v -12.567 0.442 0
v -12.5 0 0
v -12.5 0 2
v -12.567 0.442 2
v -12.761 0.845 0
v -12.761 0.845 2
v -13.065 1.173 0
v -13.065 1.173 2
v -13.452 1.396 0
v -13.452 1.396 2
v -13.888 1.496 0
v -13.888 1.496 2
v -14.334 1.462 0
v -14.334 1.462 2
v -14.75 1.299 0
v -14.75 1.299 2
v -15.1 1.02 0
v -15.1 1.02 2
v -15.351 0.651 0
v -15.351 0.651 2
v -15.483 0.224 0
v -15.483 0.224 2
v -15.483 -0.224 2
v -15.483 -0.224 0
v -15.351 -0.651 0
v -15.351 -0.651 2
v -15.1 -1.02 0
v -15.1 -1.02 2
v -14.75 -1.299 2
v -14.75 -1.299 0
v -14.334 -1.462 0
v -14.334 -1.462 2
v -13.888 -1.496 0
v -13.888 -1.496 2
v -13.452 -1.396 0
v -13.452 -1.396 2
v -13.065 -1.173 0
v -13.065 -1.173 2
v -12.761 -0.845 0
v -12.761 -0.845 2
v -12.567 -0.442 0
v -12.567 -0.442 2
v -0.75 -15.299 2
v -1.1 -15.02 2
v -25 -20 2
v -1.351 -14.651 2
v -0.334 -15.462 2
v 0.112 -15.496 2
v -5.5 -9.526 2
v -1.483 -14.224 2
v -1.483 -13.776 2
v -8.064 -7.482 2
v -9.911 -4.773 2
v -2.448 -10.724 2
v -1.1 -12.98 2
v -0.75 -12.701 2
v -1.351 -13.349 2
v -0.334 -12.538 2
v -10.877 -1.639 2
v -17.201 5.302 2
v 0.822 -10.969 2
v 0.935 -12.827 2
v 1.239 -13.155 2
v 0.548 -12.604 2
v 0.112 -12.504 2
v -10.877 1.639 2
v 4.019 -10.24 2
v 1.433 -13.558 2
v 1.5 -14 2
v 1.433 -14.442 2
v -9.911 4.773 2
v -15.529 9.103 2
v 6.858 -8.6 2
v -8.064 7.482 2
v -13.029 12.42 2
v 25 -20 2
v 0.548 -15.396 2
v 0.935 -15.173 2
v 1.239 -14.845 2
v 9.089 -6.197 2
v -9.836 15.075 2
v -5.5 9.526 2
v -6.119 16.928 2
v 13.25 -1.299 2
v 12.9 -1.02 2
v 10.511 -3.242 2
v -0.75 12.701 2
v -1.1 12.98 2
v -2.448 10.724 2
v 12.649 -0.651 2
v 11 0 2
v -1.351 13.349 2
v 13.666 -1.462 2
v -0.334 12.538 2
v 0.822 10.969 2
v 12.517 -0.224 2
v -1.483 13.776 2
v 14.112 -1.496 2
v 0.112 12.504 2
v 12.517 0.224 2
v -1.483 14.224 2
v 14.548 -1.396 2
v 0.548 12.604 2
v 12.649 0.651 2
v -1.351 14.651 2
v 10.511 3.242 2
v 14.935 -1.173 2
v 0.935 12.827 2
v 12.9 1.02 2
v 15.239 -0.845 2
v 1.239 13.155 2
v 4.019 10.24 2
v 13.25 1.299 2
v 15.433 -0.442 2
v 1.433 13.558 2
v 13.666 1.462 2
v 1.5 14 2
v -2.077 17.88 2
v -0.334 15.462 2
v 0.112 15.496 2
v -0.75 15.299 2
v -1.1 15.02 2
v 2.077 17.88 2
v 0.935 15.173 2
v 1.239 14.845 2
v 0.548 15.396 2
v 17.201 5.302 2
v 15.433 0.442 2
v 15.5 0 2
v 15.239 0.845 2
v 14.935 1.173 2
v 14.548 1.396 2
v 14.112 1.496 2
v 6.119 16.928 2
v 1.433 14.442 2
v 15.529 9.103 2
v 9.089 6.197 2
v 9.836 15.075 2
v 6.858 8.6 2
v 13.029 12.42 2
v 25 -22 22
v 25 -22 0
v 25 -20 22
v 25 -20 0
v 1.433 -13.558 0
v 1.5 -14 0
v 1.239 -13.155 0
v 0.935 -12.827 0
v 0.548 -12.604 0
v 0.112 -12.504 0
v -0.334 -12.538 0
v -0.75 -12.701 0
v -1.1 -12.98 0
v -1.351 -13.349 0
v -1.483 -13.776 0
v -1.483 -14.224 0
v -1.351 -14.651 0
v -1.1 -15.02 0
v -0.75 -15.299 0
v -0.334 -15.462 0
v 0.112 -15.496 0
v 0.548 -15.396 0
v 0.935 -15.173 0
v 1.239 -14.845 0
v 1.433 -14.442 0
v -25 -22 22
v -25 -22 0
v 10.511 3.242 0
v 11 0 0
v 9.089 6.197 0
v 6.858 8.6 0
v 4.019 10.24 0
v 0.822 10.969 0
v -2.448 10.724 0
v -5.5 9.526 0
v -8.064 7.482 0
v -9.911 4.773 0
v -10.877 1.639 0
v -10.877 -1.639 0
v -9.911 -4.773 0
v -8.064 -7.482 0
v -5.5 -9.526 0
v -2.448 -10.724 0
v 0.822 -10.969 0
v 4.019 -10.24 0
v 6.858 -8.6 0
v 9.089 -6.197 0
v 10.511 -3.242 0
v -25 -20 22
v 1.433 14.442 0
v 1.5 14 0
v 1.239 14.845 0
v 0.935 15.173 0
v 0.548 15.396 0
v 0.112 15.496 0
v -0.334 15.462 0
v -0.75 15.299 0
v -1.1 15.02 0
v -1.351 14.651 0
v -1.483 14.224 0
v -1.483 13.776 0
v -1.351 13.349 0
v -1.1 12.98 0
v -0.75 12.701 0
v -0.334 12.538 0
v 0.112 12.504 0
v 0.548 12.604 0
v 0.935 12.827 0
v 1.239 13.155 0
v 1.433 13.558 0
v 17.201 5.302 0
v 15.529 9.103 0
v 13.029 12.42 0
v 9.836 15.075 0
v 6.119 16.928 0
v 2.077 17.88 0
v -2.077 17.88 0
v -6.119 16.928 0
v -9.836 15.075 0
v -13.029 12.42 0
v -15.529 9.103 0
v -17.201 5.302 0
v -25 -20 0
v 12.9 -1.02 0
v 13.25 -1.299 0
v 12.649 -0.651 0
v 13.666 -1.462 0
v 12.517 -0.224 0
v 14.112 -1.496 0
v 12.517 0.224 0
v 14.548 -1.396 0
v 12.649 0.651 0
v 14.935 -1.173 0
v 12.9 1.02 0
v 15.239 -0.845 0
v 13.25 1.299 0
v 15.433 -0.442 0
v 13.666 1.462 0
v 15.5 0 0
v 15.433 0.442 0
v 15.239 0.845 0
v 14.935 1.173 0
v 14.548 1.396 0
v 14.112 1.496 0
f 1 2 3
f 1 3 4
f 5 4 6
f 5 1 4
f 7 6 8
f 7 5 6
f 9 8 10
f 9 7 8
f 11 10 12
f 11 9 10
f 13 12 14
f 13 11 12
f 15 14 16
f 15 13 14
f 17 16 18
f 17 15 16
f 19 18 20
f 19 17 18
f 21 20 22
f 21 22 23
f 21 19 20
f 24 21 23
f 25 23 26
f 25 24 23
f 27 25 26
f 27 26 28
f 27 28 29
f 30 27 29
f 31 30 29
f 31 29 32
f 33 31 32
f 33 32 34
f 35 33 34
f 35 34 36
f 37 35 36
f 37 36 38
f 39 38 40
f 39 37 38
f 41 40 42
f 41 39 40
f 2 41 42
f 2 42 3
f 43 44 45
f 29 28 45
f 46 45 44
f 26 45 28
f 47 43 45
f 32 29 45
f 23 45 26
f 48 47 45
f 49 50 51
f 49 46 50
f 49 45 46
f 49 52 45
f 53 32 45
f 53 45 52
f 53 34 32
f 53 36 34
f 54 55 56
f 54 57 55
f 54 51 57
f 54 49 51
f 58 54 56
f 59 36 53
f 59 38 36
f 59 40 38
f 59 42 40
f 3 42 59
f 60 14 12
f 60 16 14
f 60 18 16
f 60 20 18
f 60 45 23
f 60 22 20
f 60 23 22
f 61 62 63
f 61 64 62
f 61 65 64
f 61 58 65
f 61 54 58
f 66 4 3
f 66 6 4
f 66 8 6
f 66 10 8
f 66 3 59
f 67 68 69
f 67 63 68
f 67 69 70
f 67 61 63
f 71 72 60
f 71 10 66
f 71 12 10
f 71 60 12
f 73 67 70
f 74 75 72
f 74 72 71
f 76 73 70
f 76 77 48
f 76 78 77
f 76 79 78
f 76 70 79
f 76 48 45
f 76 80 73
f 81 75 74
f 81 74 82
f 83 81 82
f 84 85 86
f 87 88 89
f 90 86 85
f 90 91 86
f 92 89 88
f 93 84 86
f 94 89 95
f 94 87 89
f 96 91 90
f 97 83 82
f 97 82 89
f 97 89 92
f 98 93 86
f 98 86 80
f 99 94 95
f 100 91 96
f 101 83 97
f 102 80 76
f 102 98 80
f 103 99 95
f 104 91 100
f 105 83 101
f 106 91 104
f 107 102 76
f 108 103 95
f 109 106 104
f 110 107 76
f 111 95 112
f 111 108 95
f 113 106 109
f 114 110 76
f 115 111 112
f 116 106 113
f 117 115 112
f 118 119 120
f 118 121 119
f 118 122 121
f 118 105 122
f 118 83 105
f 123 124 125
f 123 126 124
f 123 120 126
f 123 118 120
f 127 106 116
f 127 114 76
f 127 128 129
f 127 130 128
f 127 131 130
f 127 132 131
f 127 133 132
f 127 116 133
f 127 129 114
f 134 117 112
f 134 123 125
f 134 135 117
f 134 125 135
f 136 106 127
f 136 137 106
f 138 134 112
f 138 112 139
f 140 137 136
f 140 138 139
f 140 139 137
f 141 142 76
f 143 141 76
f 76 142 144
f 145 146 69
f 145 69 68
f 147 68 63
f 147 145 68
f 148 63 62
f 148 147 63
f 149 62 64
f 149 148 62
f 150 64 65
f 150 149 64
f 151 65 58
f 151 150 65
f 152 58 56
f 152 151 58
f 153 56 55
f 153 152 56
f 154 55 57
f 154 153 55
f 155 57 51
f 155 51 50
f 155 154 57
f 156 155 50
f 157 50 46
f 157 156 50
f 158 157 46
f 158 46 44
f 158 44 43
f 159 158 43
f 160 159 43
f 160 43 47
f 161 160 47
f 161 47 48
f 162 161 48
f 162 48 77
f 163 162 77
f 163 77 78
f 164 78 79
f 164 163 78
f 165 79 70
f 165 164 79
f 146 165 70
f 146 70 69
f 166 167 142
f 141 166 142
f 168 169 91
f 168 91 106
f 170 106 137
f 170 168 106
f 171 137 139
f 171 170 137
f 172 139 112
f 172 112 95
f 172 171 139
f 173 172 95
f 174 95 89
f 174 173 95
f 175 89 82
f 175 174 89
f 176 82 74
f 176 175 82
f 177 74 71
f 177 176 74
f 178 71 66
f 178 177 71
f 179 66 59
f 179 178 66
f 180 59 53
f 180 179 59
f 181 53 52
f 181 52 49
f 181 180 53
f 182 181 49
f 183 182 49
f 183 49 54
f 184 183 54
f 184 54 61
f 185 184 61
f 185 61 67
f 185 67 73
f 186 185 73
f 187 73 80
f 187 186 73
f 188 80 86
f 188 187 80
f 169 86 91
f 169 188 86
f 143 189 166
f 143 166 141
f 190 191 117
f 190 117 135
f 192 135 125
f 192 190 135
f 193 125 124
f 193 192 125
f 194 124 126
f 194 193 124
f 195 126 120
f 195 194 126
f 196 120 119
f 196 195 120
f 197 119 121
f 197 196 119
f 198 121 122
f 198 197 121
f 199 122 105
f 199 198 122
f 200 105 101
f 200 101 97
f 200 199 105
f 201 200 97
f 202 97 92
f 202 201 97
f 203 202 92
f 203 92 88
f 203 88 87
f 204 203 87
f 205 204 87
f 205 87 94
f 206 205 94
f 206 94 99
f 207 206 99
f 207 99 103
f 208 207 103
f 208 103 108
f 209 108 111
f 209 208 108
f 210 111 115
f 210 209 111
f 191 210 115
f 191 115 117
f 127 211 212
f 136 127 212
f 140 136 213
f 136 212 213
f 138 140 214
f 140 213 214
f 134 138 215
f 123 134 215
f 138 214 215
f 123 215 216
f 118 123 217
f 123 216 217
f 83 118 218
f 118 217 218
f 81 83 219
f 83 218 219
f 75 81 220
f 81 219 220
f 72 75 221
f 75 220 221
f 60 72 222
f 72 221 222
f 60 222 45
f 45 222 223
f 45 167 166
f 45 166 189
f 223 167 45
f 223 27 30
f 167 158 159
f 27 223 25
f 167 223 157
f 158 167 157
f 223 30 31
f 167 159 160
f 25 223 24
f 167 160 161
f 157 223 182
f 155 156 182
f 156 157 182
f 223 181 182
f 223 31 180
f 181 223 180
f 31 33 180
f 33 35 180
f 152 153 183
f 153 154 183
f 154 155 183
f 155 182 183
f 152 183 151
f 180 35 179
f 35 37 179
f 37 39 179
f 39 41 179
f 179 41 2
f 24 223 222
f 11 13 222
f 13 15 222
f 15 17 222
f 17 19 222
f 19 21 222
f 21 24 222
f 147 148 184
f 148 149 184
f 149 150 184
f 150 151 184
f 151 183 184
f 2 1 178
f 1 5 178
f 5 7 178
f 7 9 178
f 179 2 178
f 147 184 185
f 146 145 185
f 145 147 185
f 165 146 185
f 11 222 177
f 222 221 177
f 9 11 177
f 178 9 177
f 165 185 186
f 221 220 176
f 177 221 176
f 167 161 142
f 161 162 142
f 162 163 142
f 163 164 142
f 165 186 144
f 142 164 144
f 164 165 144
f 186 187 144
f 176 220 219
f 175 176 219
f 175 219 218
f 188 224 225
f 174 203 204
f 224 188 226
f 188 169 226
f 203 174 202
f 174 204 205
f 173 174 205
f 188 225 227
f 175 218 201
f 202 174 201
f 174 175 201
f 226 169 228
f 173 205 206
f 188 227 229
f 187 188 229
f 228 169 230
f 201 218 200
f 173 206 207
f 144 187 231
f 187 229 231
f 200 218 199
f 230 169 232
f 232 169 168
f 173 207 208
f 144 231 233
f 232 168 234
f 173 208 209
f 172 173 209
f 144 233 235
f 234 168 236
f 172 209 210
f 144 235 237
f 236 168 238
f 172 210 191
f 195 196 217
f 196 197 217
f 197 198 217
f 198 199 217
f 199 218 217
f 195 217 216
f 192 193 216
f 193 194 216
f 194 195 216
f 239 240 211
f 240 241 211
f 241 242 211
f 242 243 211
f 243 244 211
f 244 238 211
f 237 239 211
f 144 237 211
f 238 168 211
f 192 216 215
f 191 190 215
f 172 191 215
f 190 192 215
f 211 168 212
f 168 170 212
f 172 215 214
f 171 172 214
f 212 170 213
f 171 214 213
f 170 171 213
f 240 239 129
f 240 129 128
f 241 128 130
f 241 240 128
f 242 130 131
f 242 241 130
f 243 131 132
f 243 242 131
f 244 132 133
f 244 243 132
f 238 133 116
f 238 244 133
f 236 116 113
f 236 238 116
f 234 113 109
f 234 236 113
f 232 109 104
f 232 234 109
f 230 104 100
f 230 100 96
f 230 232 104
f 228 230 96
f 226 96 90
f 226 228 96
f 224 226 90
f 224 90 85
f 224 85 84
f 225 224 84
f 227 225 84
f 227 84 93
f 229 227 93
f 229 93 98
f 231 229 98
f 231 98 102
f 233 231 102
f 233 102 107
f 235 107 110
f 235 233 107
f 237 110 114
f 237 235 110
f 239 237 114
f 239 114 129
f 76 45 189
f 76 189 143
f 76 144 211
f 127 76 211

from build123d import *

# Parameters (mm, degrees)
SKETCH1_R                = 11
SKETCH1_R_2              = 1.5
BOSS_EXTRUDE1_DEPTH      = 2
BOSS_EXTRUDE2_DEPTH      = 20
BOSS_EXTRUDE2_DEPTH_BACK = 2
SKETCH2_W                = 50
SKETCH2_H                = 2


with BuildPart() as part:
    # Sketch1 → Boss-Extrude1 (new body)
    with BuildSketch(Plane.XY):
        with BuildLine():
            Line((-25, -20), (25, -20))
            Line((25, -20), (17.201468929, 5.301836161))
            ThreePointArc((17.201468929, 5.301836161), (0, 18), (-17.201468929, 5.301836161))
            Line((-17.201468929, 5.301836161), (-25, -20))
        make_face()
        Circle(SKETCH1_R, mode=Mode.SUBTRACT)
        with Locations((0, 14)):
            Circle(SKETCH1_R_2, mode=Mode.SUBTRACT)
        with Locations((14, 0)):
            Circle(SKETCH1_R_2, mode=Mode.SUBTRACT)
        with Locations((0, -14)):
            Circle(SKETCH1_R_2, mode=Mode.SUBTRACT)
        with Locations((-14, 0)):
            Circle(SKETCH1_R_2, mode=Mode.SUBTRACT)
    extrude(amount=BOSS_EXTRUDE1_DEPTH)

    # Sketch2 → Boss-Extrude2 (add, two sides: drawn at the far end of the back side and taken through both)
    with BuildSketch(Plane.XY.offset(2).offset(-BOSS_EXTRUDE2_DEPTH_BACK)):
        with Locations((0, -21)):
            Rectangle(SKETCH2_W, SKETCH2_H)
    extrude(amount=BOSS_EXTRUDE2_DEPTH + BOSS_EXTRUDE2_DEPTH_BACK)


solid = part.part
